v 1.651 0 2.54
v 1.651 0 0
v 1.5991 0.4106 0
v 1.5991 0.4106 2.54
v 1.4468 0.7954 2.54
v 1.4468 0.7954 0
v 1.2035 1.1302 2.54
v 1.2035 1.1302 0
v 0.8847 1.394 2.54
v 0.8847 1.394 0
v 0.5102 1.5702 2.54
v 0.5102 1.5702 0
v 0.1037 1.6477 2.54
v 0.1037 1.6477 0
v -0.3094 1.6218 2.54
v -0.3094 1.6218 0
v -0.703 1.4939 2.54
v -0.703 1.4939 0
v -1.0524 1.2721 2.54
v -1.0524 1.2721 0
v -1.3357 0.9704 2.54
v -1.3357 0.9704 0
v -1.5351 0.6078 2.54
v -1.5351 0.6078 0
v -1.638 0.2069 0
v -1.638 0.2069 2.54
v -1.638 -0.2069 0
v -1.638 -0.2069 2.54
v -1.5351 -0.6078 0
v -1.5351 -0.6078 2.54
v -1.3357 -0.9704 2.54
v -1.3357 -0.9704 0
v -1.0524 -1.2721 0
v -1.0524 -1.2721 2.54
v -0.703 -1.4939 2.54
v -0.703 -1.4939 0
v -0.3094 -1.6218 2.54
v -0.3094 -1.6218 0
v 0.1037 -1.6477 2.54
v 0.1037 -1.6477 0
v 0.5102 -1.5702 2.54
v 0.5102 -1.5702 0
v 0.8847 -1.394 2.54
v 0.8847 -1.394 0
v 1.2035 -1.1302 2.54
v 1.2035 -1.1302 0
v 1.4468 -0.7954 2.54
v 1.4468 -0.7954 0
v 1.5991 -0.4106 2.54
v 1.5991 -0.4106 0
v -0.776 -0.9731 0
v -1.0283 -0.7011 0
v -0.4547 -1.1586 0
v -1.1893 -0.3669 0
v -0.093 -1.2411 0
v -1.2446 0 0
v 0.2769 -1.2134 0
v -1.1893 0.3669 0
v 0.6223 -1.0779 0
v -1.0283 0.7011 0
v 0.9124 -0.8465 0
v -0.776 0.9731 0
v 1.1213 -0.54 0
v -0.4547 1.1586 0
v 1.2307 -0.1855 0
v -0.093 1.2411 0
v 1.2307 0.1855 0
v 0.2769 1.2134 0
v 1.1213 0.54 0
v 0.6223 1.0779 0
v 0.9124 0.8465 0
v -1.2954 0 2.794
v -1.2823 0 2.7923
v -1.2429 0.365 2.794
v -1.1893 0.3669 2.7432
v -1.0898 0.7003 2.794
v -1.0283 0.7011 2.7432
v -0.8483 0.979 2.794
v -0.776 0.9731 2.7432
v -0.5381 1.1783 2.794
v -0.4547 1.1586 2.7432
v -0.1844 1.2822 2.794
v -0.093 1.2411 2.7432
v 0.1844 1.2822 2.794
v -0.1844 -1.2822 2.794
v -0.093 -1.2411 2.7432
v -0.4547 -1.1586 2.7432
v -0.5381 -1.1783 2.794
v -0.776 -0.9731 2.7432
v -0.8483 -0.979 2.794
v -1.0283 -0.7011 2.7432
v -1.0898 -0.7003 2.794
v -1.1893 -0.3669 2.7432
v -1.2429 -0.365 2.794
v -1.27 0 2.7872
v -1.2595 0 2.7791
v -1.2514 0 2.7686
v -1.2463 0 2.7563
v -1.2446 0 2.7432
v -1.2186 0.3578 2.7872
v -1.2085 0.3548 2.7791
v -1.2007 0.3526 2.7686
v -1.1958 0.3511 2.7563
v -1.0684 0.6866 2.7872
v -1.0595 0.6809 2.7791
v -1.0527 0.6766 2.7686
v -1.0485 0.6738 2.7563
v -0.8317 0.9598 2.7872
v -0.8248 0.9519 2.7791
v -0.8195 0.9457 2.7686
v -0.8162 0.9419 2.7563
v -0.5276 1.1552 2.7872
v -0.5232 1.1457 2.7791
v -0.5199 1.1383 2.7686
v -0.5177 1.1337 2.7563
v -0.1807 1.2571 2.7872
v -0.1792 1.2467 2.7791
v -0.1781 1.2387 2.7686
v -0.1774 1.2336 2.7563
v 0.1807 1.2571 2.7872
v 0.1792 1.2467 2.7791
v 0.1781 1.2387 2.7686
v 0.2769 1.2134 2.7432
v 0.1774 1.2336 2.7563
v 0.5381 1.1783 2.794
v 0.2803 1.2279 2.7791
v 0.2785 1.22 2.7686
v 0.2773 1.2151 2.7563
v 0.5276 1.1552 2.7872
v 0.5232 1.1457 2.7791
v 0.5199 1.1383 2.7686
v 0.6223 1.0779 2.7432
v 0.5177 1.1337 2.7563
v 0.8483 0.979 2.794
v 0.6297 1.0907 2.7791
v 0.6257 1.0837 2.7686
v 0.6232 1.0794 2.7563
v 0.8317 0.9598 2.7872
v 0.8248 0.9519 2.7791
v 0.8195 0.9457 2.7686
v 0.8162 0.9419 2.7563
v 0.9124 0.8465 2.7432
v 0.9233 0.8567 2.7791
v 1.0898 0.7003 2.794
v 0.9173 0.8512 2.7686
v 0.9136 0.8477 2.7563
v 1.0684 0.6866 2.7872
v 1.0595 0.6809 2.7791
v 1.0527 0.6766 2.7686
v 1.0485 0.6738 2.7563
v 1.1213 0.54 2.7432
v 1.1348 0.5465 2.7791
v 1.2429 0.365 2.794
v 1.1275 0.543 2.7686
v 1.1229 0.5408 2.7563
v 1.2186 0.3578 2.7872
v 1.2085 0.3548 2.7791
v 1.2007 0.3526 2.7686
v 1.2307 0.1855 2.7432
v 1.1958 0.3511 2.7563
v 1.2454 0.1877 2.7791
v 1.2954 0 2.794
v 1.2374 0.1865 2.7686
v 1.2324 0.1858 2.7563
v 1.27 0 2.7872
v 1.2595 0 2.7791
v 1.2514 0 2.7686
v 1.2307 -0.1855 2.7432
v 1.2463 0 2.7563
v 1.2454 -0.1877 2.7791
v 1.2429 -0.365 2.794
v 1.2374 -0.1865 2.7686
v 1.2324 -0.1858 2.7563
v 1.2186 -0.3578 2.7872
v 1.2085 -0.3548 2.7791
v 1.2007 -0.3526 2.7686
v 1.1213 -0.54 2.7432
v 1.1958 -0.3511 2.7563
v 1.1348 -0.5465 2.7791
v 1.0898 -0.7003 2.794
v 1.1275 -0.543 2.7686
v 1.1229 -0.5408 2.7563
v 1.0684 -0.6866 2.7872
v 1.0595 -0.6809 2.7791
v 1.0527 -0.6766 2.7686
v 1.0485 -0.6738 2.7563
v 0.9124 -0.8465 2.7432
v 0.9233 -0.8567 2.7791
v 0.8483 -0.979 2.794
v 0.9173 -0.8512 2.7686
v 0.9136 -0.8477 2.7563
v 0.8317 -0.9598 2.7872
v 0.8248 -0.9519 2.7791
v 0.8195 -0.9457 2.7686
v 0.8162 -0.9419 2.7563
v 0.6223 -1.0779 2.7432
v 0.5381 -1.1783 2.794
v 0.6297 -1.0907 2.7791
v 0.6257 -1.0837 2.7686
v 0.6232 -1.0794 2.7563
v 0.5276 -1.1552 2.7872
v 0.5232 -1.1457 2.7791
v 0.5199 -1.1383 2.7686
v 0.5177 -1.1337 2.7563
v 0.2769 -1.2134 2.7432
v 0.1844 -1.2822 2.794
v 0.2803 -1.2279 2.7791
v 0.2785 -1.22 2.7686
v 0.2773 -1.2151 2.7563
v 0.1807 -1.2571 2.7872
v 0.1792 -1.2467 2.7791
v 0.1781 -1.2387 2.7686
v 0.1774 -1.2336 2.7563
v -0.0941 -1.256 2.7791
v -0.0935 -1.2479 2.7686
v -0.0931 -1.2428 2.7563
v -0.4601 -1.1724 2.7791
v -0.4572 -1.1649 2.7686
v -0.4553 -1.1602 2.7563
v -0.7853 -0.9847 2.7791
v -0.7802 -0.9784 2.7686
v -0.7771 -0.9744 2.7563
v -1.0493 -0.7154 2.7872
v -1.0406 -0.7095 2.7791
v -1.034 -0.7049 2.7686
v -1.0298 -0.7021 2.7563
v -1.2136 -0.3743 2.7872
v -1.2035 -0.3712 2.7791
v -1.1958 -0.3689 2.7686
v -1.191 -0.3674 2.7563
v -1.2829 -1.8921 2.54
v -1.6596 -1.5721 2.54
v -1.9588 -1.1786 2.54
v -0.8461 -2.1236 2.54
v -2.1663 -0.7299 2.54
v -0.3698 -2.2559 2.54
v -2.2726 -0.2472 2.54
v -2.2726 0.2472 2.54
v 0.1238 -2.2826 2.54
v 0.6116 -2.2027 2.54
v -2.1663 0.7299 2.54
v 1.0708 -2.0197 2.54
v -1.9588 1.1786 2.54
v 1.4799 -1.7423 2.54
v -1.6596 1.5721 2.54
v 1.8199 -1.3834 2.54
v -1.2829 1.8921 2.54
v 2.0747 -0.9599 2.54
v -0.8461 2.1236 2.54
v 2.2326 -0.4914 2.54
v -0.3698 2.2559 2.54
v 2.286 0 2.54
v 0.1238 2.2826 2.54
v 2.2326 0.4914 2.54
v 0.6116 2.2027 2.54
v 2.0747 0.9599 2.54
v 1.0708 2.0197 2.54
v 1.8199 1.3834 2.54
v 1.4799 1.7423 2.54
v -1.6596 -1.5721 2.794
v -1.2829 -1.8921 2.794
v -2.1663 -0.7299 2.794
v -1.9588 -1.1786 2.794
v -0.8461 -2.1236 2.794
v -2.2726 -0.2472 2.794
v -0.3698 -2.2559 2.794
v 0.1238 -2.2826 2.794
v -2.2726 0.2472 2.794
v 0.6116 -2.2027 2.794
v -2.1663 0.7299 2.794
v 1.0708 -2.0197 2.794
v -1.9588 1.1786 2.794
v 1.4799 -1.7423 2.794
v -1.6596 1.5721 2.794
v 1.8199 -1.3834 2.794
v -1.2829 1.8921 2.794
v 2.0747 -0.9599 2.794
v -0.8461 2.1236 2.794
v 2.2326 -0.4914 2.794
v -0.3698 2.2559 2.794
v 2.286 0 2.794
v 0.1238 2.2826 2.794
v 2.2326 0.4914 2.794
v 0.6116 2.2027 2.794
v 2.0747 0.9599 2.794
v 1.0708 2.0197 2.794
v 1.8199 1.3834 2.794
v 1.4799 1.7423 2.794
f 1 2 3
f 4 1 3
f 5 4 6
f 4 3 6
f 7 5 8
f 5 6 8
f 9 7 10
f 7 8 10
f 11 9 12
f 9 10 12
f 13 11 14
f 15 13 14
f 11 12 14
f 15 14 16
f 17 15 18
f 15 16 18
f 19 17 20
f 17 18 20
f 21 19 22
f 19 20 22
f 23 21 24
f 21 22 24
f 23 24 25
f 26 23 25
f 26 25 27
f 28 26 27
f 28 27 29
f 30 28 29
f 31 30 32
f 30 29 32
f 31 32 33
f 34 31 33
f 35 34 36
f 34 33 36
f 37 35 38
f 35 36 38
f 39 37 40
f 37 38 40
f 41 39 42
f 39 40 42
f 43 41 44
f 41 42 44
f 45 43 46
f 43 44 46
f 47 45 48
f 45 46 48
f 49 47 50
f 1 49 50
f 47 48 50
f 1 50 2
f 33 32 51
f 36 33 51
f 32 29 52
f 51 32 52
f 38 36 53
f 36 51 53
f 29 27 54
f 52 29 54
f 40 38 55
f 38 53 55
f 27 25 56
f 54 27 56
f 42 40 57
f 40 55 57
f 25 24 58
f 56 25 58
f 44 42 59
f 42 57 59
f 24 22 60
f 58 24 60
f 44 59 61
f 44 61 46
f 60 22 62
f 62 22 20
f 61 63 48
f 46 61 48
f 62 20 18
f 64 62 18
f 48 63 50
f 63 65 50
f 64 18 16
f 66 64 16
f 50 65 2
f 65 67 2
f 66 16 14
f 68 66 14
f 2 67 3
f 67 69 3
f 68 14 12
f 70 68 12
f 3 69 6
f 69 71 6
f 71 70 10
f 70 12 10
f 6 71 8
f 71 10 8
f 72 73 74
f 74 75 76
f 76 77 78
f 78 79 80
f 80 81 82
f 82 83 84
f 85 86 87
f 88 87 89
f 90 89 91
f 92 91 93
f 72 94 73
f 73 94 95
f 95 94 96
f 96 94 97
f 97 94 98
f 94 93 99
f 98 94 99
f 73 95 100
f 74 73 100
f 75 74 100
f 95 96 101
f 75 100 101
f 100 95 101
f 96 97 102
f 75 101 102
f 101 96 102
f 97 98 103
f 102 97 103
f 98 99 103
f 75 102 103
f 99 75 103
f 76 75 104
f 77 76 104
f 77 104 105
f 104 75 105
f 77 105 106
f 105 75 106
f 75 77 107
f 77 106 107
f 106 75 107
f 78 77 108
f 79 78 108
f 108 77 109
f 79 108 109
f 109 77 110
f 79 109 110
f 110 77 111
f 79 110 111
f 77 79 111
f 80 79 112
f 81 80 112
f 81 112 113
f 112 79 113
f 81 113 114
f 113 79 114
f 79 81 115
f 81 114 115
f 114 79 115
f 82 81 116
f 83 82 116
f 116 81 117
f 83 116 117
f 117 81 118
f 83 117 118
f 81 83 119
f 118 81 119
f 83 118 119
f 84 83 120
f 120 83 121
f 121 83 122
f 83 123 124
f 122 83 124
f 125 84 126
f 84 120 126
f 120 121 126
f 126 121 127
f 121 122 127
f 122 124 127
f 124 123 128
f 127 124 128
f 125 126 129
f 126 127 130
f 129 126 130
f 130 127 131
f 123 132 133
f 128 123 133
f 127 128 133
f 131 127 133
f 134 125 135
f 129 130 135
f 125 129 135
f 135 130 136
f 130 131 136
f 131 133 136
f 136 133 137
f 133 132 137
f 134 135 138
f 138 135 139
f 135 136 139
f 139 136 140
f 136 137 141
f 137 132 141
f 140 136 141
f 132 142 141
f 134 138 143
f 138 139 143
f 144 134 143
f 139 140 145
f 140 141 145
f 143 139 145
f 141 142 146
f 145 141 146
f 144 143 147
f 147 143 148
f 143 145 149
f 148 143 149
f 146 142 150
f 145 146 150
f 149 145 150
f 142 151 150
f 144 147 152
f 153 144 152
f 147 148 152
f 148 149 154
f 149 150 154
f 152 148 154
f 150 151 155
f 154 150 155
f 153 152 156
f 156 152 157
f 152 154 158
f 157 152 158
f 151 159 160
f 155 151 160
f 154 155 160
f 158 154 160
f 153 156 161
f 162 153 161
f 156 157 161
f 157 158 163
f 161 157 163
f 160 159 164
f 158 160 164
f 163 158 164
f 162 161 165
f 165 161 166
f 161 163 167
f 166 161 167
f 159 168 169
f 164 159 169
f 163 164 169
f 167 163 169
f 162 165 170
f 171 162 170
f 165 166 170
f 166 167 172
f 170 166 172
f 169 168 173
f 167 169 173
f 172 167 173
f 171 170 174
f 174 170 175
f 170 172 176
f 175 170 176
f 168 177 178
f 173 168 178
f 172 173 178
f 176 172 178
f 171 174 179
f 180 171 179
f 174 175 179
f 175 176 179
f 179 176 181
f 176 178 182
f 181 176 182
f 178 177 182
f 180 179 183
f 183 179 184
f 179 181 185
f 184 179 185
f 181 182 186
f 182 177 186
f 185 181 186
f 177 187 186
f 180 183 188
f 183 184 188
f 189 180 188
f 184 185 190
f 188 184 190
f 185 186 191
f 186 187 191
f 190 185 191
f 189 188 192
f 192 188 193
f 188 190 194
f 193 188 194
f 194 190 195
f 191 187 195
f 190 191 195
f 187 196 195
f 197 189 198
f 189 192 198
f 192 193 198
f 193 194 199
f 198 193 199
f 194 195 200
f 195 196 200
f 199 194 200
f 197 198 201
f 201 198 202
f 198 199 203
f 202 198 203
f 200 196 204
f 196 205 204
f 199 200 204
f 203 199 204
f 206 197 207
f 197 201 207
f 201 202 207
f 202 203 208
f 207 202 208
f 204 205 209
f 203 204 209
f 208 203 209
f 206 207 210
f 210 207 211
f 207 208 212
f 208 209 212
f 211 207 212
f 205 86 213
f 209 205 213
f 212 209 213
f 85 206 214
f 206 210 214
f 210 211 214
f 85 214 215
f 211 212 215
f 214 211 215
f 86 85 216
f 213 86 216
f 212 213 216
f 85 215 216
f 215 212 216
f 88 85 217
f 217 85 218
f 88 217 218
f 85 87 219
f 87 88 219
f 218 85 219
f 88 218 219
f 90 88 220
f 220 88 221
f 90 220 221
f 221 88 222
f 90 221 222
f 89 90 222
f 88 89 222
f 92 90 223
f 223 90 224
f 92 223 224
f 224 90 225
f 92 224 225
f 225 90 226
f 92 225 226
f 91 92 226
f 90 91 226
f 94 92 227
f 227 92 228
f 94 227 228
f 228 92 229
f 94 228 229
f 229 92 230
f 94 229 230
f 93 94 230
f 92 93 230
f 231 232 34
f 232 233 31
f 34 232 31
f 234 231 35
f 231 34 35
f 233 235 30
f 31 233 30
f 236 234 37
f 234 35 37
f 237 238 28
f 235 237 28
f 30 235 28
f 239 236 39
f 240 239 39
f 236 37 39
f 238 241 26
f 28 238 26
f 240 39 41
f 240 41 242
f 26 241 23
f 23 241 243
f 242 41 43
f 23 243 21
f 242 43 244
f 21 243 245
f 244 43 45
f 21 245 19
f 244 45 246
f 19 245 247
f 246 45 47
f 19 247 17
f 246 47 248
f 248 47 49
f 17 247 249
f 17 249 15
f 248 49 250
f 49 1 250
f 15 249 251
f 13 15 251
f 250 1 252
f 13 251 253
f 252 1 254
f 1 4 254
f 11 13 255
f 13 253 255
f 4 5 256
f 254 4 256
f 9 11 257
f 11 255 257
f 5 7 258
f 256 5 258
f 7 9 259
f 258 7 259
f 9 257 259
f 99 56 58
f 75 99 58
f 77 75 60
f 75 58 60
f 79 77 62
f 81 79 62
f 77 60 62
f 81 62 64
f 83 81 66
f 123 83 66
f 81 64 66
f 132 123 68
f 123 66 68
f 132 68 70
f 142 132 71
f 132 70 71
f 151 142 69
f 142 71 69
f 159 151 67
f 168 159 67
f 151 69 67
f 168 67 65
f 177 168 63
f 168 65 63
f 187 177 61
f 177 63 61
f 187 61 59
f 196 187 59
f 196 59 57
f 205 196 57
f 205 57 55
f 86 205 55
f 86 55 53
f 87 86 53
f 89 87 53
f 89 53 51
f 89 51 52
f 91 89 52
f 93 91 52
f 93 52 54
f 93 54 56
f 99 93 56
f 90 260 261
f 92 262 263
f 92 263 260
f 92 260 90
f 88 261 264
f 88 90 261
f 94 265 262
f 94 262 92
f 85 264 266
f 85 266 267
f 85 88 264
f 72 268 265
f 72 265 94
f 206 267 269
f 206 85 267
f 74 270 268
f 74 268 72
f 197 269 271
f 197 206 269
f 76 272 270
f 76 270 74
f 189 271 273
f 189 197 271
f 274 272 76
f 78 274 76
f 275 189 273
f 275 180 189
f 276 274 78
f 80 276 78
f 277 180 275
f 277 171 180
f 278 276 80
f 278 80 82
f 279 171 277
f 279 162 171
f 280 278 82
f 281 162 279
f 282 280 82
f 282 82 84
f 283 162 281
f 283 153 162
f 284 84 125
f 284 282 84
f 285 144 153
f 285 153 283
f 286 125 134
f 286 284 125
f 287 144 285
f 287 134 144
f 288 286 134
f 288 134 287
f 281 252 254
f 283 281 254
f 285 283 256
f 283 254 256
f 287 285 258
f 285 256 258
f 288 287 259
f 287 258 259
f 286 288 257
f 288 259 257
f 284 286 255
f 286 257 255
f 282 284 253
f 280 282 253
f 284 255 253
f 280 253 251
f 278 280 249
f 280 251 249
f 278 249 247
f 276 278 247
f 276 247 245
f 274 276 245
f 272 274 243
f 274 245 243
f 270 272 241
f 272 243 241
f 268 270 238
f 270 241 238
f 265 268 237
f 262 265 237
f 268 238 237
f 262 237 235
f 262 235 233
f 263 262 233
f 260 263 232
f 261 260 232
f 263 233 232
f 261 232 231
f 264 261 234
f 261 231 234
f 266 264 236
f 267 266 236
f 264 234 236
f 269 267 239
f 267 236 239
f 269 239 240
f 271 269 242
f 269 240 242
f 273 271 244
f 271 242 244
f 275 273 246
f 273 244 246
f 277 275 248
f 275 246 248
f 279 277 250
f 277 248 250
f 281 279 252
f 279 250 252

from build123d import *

# Parameters (mm, degrees)
SKETCH1_R               = 1.651
BOSS_EXTRUDE1_DEPTH     = 2.54
SKETCH2_R               = 2.286
BOSS_EXTRUDE2_DEPTH     = 0.254
SKETCH3_R               = 1.2446
CUT_EXTRUDE3_DEPTH      = 1
CUT_EXTRUDE3_DEPTH_BACK = 3.794
FILLET3_R               = 0.0508


with BuildPart() as part:
    # Sketch1 → Boss-Extrude1 (new body)
    with BuildSketch(Plane.XY):
        Circle(SKETCH1_R)
    extrude(amount=BOSS_EXTRUDE1_DEPTH)

    # Sketch2 → Boss-Extrude2 (add)
    with BuildSketch(Plane.XY.offset(2.54)):
        Circle(SKETCH2_R)
    extrude(amount=BOSS_EXTRUDE2_DEPTH)

    # Sketch3 → Cut-Extrude3 (cut, two sides)
    with BuildSketch(Plane(origin=(0, 0, 0), x_dir=(-1, 0, 0), z_dir=(0, 0, -1))) as cut_extrude3_sk:
        Circle(SKETCH3_R)
    extrude(amount=CUT_EXTRUDE3_DEPTH, mode=Mode.SUBTRACT)
    extrude(cut_extrude3_sk.sketch, amount=-CUT_EXTRUDE3_DEPTH_BACK, mode=Mode.SUBTRACT)

    # Fillet3
    fillet3_edges = [part.edges().sort_by_distance(p)[0] for p in [
        (1.2446, 0, 2.794),
    ]]
    fillet(fillet3_edges, radius=FILLET3_R)


solid = part.part
